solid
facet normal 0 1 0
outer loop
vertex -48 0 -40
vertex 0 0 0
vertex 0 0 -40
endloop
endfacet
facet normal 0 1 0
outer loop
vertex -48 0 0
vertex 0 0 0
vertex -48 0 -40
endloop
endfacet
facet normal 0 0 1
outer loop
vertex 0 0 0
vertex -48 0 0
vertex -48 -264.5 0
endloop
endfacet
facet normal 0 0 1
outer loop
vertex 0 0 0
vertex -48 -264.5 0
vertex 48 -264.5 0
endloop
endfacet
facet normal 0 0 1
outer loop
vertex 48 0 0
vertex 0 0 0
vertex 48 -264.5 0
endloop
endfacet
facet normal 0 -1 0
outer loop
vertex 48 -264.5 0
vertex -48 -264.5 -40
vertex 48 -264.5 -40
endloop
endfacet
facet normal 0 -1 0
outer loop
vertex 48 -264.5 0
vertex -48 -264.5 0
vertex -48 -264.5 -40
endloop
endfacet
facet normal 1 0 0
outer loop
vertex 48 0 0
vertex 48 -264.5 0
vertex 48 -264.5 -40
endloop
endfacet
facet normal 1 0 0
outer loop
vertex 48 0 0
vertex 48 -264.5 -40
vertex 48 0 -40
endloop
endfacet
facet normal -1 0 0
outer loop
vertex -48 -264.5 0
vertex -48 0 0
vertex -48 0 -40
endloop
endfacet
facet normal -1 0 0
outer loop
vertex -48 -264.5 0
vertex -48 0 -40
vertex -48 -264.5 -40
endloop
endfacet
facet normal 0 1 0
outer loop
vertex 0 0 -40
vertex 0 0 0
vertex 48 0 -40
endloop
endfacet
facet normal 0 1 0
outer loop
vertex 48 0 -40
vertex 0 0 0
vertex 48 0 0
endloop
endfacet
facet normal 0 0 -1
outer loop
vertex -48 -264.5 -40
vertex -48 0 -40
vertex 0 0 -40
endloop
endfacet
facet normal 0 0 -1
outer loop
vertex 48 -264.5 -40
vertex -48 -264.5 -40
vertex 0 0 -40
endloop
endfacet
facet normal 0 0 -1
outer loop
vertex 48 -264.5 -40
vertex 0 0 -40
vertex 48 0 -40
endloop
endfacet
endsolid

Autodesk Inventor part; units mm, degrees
ref_plane "YZ Plane" through (0, 0, 0) normal (1, 0, 0) x (0, 1, 0)
ref_plane "XZ Plane" through (0, 0, 0) normal (0, 1, 0) x (-1, 0, 0)
ref_plane "XY Plane" through (0, 0, 0) normal (0, 0, 1) x (1, 0, 0)
sketch "Boceto1" plane through (0, 0, 0) normal (0, 0, 1) x (1, 0, 0)
  line L0 (0, 0) -> (48, 0)
  line L1 (0, 0) -> (-48, 0)
  line L2 (-48, 0) -> (-48, -264.5)
  line L3 (-48, -264.5) -> (48, -264.5)
  line L4 (48, -264.5) -> (48, 0)
  dimension "d0" = 48
  dimension "d1" = 48
  dimension "d2" = 264.5
extrude "Extrusión1" add sketch "Boceto1" against normal blind 40
sketch "Boceto2" plane through (48, -264.5, 0) normal (1, 0, 0) x (0, 0, -1)
  point P0 (0, 264.5)
properties part number "Knee_v1"
